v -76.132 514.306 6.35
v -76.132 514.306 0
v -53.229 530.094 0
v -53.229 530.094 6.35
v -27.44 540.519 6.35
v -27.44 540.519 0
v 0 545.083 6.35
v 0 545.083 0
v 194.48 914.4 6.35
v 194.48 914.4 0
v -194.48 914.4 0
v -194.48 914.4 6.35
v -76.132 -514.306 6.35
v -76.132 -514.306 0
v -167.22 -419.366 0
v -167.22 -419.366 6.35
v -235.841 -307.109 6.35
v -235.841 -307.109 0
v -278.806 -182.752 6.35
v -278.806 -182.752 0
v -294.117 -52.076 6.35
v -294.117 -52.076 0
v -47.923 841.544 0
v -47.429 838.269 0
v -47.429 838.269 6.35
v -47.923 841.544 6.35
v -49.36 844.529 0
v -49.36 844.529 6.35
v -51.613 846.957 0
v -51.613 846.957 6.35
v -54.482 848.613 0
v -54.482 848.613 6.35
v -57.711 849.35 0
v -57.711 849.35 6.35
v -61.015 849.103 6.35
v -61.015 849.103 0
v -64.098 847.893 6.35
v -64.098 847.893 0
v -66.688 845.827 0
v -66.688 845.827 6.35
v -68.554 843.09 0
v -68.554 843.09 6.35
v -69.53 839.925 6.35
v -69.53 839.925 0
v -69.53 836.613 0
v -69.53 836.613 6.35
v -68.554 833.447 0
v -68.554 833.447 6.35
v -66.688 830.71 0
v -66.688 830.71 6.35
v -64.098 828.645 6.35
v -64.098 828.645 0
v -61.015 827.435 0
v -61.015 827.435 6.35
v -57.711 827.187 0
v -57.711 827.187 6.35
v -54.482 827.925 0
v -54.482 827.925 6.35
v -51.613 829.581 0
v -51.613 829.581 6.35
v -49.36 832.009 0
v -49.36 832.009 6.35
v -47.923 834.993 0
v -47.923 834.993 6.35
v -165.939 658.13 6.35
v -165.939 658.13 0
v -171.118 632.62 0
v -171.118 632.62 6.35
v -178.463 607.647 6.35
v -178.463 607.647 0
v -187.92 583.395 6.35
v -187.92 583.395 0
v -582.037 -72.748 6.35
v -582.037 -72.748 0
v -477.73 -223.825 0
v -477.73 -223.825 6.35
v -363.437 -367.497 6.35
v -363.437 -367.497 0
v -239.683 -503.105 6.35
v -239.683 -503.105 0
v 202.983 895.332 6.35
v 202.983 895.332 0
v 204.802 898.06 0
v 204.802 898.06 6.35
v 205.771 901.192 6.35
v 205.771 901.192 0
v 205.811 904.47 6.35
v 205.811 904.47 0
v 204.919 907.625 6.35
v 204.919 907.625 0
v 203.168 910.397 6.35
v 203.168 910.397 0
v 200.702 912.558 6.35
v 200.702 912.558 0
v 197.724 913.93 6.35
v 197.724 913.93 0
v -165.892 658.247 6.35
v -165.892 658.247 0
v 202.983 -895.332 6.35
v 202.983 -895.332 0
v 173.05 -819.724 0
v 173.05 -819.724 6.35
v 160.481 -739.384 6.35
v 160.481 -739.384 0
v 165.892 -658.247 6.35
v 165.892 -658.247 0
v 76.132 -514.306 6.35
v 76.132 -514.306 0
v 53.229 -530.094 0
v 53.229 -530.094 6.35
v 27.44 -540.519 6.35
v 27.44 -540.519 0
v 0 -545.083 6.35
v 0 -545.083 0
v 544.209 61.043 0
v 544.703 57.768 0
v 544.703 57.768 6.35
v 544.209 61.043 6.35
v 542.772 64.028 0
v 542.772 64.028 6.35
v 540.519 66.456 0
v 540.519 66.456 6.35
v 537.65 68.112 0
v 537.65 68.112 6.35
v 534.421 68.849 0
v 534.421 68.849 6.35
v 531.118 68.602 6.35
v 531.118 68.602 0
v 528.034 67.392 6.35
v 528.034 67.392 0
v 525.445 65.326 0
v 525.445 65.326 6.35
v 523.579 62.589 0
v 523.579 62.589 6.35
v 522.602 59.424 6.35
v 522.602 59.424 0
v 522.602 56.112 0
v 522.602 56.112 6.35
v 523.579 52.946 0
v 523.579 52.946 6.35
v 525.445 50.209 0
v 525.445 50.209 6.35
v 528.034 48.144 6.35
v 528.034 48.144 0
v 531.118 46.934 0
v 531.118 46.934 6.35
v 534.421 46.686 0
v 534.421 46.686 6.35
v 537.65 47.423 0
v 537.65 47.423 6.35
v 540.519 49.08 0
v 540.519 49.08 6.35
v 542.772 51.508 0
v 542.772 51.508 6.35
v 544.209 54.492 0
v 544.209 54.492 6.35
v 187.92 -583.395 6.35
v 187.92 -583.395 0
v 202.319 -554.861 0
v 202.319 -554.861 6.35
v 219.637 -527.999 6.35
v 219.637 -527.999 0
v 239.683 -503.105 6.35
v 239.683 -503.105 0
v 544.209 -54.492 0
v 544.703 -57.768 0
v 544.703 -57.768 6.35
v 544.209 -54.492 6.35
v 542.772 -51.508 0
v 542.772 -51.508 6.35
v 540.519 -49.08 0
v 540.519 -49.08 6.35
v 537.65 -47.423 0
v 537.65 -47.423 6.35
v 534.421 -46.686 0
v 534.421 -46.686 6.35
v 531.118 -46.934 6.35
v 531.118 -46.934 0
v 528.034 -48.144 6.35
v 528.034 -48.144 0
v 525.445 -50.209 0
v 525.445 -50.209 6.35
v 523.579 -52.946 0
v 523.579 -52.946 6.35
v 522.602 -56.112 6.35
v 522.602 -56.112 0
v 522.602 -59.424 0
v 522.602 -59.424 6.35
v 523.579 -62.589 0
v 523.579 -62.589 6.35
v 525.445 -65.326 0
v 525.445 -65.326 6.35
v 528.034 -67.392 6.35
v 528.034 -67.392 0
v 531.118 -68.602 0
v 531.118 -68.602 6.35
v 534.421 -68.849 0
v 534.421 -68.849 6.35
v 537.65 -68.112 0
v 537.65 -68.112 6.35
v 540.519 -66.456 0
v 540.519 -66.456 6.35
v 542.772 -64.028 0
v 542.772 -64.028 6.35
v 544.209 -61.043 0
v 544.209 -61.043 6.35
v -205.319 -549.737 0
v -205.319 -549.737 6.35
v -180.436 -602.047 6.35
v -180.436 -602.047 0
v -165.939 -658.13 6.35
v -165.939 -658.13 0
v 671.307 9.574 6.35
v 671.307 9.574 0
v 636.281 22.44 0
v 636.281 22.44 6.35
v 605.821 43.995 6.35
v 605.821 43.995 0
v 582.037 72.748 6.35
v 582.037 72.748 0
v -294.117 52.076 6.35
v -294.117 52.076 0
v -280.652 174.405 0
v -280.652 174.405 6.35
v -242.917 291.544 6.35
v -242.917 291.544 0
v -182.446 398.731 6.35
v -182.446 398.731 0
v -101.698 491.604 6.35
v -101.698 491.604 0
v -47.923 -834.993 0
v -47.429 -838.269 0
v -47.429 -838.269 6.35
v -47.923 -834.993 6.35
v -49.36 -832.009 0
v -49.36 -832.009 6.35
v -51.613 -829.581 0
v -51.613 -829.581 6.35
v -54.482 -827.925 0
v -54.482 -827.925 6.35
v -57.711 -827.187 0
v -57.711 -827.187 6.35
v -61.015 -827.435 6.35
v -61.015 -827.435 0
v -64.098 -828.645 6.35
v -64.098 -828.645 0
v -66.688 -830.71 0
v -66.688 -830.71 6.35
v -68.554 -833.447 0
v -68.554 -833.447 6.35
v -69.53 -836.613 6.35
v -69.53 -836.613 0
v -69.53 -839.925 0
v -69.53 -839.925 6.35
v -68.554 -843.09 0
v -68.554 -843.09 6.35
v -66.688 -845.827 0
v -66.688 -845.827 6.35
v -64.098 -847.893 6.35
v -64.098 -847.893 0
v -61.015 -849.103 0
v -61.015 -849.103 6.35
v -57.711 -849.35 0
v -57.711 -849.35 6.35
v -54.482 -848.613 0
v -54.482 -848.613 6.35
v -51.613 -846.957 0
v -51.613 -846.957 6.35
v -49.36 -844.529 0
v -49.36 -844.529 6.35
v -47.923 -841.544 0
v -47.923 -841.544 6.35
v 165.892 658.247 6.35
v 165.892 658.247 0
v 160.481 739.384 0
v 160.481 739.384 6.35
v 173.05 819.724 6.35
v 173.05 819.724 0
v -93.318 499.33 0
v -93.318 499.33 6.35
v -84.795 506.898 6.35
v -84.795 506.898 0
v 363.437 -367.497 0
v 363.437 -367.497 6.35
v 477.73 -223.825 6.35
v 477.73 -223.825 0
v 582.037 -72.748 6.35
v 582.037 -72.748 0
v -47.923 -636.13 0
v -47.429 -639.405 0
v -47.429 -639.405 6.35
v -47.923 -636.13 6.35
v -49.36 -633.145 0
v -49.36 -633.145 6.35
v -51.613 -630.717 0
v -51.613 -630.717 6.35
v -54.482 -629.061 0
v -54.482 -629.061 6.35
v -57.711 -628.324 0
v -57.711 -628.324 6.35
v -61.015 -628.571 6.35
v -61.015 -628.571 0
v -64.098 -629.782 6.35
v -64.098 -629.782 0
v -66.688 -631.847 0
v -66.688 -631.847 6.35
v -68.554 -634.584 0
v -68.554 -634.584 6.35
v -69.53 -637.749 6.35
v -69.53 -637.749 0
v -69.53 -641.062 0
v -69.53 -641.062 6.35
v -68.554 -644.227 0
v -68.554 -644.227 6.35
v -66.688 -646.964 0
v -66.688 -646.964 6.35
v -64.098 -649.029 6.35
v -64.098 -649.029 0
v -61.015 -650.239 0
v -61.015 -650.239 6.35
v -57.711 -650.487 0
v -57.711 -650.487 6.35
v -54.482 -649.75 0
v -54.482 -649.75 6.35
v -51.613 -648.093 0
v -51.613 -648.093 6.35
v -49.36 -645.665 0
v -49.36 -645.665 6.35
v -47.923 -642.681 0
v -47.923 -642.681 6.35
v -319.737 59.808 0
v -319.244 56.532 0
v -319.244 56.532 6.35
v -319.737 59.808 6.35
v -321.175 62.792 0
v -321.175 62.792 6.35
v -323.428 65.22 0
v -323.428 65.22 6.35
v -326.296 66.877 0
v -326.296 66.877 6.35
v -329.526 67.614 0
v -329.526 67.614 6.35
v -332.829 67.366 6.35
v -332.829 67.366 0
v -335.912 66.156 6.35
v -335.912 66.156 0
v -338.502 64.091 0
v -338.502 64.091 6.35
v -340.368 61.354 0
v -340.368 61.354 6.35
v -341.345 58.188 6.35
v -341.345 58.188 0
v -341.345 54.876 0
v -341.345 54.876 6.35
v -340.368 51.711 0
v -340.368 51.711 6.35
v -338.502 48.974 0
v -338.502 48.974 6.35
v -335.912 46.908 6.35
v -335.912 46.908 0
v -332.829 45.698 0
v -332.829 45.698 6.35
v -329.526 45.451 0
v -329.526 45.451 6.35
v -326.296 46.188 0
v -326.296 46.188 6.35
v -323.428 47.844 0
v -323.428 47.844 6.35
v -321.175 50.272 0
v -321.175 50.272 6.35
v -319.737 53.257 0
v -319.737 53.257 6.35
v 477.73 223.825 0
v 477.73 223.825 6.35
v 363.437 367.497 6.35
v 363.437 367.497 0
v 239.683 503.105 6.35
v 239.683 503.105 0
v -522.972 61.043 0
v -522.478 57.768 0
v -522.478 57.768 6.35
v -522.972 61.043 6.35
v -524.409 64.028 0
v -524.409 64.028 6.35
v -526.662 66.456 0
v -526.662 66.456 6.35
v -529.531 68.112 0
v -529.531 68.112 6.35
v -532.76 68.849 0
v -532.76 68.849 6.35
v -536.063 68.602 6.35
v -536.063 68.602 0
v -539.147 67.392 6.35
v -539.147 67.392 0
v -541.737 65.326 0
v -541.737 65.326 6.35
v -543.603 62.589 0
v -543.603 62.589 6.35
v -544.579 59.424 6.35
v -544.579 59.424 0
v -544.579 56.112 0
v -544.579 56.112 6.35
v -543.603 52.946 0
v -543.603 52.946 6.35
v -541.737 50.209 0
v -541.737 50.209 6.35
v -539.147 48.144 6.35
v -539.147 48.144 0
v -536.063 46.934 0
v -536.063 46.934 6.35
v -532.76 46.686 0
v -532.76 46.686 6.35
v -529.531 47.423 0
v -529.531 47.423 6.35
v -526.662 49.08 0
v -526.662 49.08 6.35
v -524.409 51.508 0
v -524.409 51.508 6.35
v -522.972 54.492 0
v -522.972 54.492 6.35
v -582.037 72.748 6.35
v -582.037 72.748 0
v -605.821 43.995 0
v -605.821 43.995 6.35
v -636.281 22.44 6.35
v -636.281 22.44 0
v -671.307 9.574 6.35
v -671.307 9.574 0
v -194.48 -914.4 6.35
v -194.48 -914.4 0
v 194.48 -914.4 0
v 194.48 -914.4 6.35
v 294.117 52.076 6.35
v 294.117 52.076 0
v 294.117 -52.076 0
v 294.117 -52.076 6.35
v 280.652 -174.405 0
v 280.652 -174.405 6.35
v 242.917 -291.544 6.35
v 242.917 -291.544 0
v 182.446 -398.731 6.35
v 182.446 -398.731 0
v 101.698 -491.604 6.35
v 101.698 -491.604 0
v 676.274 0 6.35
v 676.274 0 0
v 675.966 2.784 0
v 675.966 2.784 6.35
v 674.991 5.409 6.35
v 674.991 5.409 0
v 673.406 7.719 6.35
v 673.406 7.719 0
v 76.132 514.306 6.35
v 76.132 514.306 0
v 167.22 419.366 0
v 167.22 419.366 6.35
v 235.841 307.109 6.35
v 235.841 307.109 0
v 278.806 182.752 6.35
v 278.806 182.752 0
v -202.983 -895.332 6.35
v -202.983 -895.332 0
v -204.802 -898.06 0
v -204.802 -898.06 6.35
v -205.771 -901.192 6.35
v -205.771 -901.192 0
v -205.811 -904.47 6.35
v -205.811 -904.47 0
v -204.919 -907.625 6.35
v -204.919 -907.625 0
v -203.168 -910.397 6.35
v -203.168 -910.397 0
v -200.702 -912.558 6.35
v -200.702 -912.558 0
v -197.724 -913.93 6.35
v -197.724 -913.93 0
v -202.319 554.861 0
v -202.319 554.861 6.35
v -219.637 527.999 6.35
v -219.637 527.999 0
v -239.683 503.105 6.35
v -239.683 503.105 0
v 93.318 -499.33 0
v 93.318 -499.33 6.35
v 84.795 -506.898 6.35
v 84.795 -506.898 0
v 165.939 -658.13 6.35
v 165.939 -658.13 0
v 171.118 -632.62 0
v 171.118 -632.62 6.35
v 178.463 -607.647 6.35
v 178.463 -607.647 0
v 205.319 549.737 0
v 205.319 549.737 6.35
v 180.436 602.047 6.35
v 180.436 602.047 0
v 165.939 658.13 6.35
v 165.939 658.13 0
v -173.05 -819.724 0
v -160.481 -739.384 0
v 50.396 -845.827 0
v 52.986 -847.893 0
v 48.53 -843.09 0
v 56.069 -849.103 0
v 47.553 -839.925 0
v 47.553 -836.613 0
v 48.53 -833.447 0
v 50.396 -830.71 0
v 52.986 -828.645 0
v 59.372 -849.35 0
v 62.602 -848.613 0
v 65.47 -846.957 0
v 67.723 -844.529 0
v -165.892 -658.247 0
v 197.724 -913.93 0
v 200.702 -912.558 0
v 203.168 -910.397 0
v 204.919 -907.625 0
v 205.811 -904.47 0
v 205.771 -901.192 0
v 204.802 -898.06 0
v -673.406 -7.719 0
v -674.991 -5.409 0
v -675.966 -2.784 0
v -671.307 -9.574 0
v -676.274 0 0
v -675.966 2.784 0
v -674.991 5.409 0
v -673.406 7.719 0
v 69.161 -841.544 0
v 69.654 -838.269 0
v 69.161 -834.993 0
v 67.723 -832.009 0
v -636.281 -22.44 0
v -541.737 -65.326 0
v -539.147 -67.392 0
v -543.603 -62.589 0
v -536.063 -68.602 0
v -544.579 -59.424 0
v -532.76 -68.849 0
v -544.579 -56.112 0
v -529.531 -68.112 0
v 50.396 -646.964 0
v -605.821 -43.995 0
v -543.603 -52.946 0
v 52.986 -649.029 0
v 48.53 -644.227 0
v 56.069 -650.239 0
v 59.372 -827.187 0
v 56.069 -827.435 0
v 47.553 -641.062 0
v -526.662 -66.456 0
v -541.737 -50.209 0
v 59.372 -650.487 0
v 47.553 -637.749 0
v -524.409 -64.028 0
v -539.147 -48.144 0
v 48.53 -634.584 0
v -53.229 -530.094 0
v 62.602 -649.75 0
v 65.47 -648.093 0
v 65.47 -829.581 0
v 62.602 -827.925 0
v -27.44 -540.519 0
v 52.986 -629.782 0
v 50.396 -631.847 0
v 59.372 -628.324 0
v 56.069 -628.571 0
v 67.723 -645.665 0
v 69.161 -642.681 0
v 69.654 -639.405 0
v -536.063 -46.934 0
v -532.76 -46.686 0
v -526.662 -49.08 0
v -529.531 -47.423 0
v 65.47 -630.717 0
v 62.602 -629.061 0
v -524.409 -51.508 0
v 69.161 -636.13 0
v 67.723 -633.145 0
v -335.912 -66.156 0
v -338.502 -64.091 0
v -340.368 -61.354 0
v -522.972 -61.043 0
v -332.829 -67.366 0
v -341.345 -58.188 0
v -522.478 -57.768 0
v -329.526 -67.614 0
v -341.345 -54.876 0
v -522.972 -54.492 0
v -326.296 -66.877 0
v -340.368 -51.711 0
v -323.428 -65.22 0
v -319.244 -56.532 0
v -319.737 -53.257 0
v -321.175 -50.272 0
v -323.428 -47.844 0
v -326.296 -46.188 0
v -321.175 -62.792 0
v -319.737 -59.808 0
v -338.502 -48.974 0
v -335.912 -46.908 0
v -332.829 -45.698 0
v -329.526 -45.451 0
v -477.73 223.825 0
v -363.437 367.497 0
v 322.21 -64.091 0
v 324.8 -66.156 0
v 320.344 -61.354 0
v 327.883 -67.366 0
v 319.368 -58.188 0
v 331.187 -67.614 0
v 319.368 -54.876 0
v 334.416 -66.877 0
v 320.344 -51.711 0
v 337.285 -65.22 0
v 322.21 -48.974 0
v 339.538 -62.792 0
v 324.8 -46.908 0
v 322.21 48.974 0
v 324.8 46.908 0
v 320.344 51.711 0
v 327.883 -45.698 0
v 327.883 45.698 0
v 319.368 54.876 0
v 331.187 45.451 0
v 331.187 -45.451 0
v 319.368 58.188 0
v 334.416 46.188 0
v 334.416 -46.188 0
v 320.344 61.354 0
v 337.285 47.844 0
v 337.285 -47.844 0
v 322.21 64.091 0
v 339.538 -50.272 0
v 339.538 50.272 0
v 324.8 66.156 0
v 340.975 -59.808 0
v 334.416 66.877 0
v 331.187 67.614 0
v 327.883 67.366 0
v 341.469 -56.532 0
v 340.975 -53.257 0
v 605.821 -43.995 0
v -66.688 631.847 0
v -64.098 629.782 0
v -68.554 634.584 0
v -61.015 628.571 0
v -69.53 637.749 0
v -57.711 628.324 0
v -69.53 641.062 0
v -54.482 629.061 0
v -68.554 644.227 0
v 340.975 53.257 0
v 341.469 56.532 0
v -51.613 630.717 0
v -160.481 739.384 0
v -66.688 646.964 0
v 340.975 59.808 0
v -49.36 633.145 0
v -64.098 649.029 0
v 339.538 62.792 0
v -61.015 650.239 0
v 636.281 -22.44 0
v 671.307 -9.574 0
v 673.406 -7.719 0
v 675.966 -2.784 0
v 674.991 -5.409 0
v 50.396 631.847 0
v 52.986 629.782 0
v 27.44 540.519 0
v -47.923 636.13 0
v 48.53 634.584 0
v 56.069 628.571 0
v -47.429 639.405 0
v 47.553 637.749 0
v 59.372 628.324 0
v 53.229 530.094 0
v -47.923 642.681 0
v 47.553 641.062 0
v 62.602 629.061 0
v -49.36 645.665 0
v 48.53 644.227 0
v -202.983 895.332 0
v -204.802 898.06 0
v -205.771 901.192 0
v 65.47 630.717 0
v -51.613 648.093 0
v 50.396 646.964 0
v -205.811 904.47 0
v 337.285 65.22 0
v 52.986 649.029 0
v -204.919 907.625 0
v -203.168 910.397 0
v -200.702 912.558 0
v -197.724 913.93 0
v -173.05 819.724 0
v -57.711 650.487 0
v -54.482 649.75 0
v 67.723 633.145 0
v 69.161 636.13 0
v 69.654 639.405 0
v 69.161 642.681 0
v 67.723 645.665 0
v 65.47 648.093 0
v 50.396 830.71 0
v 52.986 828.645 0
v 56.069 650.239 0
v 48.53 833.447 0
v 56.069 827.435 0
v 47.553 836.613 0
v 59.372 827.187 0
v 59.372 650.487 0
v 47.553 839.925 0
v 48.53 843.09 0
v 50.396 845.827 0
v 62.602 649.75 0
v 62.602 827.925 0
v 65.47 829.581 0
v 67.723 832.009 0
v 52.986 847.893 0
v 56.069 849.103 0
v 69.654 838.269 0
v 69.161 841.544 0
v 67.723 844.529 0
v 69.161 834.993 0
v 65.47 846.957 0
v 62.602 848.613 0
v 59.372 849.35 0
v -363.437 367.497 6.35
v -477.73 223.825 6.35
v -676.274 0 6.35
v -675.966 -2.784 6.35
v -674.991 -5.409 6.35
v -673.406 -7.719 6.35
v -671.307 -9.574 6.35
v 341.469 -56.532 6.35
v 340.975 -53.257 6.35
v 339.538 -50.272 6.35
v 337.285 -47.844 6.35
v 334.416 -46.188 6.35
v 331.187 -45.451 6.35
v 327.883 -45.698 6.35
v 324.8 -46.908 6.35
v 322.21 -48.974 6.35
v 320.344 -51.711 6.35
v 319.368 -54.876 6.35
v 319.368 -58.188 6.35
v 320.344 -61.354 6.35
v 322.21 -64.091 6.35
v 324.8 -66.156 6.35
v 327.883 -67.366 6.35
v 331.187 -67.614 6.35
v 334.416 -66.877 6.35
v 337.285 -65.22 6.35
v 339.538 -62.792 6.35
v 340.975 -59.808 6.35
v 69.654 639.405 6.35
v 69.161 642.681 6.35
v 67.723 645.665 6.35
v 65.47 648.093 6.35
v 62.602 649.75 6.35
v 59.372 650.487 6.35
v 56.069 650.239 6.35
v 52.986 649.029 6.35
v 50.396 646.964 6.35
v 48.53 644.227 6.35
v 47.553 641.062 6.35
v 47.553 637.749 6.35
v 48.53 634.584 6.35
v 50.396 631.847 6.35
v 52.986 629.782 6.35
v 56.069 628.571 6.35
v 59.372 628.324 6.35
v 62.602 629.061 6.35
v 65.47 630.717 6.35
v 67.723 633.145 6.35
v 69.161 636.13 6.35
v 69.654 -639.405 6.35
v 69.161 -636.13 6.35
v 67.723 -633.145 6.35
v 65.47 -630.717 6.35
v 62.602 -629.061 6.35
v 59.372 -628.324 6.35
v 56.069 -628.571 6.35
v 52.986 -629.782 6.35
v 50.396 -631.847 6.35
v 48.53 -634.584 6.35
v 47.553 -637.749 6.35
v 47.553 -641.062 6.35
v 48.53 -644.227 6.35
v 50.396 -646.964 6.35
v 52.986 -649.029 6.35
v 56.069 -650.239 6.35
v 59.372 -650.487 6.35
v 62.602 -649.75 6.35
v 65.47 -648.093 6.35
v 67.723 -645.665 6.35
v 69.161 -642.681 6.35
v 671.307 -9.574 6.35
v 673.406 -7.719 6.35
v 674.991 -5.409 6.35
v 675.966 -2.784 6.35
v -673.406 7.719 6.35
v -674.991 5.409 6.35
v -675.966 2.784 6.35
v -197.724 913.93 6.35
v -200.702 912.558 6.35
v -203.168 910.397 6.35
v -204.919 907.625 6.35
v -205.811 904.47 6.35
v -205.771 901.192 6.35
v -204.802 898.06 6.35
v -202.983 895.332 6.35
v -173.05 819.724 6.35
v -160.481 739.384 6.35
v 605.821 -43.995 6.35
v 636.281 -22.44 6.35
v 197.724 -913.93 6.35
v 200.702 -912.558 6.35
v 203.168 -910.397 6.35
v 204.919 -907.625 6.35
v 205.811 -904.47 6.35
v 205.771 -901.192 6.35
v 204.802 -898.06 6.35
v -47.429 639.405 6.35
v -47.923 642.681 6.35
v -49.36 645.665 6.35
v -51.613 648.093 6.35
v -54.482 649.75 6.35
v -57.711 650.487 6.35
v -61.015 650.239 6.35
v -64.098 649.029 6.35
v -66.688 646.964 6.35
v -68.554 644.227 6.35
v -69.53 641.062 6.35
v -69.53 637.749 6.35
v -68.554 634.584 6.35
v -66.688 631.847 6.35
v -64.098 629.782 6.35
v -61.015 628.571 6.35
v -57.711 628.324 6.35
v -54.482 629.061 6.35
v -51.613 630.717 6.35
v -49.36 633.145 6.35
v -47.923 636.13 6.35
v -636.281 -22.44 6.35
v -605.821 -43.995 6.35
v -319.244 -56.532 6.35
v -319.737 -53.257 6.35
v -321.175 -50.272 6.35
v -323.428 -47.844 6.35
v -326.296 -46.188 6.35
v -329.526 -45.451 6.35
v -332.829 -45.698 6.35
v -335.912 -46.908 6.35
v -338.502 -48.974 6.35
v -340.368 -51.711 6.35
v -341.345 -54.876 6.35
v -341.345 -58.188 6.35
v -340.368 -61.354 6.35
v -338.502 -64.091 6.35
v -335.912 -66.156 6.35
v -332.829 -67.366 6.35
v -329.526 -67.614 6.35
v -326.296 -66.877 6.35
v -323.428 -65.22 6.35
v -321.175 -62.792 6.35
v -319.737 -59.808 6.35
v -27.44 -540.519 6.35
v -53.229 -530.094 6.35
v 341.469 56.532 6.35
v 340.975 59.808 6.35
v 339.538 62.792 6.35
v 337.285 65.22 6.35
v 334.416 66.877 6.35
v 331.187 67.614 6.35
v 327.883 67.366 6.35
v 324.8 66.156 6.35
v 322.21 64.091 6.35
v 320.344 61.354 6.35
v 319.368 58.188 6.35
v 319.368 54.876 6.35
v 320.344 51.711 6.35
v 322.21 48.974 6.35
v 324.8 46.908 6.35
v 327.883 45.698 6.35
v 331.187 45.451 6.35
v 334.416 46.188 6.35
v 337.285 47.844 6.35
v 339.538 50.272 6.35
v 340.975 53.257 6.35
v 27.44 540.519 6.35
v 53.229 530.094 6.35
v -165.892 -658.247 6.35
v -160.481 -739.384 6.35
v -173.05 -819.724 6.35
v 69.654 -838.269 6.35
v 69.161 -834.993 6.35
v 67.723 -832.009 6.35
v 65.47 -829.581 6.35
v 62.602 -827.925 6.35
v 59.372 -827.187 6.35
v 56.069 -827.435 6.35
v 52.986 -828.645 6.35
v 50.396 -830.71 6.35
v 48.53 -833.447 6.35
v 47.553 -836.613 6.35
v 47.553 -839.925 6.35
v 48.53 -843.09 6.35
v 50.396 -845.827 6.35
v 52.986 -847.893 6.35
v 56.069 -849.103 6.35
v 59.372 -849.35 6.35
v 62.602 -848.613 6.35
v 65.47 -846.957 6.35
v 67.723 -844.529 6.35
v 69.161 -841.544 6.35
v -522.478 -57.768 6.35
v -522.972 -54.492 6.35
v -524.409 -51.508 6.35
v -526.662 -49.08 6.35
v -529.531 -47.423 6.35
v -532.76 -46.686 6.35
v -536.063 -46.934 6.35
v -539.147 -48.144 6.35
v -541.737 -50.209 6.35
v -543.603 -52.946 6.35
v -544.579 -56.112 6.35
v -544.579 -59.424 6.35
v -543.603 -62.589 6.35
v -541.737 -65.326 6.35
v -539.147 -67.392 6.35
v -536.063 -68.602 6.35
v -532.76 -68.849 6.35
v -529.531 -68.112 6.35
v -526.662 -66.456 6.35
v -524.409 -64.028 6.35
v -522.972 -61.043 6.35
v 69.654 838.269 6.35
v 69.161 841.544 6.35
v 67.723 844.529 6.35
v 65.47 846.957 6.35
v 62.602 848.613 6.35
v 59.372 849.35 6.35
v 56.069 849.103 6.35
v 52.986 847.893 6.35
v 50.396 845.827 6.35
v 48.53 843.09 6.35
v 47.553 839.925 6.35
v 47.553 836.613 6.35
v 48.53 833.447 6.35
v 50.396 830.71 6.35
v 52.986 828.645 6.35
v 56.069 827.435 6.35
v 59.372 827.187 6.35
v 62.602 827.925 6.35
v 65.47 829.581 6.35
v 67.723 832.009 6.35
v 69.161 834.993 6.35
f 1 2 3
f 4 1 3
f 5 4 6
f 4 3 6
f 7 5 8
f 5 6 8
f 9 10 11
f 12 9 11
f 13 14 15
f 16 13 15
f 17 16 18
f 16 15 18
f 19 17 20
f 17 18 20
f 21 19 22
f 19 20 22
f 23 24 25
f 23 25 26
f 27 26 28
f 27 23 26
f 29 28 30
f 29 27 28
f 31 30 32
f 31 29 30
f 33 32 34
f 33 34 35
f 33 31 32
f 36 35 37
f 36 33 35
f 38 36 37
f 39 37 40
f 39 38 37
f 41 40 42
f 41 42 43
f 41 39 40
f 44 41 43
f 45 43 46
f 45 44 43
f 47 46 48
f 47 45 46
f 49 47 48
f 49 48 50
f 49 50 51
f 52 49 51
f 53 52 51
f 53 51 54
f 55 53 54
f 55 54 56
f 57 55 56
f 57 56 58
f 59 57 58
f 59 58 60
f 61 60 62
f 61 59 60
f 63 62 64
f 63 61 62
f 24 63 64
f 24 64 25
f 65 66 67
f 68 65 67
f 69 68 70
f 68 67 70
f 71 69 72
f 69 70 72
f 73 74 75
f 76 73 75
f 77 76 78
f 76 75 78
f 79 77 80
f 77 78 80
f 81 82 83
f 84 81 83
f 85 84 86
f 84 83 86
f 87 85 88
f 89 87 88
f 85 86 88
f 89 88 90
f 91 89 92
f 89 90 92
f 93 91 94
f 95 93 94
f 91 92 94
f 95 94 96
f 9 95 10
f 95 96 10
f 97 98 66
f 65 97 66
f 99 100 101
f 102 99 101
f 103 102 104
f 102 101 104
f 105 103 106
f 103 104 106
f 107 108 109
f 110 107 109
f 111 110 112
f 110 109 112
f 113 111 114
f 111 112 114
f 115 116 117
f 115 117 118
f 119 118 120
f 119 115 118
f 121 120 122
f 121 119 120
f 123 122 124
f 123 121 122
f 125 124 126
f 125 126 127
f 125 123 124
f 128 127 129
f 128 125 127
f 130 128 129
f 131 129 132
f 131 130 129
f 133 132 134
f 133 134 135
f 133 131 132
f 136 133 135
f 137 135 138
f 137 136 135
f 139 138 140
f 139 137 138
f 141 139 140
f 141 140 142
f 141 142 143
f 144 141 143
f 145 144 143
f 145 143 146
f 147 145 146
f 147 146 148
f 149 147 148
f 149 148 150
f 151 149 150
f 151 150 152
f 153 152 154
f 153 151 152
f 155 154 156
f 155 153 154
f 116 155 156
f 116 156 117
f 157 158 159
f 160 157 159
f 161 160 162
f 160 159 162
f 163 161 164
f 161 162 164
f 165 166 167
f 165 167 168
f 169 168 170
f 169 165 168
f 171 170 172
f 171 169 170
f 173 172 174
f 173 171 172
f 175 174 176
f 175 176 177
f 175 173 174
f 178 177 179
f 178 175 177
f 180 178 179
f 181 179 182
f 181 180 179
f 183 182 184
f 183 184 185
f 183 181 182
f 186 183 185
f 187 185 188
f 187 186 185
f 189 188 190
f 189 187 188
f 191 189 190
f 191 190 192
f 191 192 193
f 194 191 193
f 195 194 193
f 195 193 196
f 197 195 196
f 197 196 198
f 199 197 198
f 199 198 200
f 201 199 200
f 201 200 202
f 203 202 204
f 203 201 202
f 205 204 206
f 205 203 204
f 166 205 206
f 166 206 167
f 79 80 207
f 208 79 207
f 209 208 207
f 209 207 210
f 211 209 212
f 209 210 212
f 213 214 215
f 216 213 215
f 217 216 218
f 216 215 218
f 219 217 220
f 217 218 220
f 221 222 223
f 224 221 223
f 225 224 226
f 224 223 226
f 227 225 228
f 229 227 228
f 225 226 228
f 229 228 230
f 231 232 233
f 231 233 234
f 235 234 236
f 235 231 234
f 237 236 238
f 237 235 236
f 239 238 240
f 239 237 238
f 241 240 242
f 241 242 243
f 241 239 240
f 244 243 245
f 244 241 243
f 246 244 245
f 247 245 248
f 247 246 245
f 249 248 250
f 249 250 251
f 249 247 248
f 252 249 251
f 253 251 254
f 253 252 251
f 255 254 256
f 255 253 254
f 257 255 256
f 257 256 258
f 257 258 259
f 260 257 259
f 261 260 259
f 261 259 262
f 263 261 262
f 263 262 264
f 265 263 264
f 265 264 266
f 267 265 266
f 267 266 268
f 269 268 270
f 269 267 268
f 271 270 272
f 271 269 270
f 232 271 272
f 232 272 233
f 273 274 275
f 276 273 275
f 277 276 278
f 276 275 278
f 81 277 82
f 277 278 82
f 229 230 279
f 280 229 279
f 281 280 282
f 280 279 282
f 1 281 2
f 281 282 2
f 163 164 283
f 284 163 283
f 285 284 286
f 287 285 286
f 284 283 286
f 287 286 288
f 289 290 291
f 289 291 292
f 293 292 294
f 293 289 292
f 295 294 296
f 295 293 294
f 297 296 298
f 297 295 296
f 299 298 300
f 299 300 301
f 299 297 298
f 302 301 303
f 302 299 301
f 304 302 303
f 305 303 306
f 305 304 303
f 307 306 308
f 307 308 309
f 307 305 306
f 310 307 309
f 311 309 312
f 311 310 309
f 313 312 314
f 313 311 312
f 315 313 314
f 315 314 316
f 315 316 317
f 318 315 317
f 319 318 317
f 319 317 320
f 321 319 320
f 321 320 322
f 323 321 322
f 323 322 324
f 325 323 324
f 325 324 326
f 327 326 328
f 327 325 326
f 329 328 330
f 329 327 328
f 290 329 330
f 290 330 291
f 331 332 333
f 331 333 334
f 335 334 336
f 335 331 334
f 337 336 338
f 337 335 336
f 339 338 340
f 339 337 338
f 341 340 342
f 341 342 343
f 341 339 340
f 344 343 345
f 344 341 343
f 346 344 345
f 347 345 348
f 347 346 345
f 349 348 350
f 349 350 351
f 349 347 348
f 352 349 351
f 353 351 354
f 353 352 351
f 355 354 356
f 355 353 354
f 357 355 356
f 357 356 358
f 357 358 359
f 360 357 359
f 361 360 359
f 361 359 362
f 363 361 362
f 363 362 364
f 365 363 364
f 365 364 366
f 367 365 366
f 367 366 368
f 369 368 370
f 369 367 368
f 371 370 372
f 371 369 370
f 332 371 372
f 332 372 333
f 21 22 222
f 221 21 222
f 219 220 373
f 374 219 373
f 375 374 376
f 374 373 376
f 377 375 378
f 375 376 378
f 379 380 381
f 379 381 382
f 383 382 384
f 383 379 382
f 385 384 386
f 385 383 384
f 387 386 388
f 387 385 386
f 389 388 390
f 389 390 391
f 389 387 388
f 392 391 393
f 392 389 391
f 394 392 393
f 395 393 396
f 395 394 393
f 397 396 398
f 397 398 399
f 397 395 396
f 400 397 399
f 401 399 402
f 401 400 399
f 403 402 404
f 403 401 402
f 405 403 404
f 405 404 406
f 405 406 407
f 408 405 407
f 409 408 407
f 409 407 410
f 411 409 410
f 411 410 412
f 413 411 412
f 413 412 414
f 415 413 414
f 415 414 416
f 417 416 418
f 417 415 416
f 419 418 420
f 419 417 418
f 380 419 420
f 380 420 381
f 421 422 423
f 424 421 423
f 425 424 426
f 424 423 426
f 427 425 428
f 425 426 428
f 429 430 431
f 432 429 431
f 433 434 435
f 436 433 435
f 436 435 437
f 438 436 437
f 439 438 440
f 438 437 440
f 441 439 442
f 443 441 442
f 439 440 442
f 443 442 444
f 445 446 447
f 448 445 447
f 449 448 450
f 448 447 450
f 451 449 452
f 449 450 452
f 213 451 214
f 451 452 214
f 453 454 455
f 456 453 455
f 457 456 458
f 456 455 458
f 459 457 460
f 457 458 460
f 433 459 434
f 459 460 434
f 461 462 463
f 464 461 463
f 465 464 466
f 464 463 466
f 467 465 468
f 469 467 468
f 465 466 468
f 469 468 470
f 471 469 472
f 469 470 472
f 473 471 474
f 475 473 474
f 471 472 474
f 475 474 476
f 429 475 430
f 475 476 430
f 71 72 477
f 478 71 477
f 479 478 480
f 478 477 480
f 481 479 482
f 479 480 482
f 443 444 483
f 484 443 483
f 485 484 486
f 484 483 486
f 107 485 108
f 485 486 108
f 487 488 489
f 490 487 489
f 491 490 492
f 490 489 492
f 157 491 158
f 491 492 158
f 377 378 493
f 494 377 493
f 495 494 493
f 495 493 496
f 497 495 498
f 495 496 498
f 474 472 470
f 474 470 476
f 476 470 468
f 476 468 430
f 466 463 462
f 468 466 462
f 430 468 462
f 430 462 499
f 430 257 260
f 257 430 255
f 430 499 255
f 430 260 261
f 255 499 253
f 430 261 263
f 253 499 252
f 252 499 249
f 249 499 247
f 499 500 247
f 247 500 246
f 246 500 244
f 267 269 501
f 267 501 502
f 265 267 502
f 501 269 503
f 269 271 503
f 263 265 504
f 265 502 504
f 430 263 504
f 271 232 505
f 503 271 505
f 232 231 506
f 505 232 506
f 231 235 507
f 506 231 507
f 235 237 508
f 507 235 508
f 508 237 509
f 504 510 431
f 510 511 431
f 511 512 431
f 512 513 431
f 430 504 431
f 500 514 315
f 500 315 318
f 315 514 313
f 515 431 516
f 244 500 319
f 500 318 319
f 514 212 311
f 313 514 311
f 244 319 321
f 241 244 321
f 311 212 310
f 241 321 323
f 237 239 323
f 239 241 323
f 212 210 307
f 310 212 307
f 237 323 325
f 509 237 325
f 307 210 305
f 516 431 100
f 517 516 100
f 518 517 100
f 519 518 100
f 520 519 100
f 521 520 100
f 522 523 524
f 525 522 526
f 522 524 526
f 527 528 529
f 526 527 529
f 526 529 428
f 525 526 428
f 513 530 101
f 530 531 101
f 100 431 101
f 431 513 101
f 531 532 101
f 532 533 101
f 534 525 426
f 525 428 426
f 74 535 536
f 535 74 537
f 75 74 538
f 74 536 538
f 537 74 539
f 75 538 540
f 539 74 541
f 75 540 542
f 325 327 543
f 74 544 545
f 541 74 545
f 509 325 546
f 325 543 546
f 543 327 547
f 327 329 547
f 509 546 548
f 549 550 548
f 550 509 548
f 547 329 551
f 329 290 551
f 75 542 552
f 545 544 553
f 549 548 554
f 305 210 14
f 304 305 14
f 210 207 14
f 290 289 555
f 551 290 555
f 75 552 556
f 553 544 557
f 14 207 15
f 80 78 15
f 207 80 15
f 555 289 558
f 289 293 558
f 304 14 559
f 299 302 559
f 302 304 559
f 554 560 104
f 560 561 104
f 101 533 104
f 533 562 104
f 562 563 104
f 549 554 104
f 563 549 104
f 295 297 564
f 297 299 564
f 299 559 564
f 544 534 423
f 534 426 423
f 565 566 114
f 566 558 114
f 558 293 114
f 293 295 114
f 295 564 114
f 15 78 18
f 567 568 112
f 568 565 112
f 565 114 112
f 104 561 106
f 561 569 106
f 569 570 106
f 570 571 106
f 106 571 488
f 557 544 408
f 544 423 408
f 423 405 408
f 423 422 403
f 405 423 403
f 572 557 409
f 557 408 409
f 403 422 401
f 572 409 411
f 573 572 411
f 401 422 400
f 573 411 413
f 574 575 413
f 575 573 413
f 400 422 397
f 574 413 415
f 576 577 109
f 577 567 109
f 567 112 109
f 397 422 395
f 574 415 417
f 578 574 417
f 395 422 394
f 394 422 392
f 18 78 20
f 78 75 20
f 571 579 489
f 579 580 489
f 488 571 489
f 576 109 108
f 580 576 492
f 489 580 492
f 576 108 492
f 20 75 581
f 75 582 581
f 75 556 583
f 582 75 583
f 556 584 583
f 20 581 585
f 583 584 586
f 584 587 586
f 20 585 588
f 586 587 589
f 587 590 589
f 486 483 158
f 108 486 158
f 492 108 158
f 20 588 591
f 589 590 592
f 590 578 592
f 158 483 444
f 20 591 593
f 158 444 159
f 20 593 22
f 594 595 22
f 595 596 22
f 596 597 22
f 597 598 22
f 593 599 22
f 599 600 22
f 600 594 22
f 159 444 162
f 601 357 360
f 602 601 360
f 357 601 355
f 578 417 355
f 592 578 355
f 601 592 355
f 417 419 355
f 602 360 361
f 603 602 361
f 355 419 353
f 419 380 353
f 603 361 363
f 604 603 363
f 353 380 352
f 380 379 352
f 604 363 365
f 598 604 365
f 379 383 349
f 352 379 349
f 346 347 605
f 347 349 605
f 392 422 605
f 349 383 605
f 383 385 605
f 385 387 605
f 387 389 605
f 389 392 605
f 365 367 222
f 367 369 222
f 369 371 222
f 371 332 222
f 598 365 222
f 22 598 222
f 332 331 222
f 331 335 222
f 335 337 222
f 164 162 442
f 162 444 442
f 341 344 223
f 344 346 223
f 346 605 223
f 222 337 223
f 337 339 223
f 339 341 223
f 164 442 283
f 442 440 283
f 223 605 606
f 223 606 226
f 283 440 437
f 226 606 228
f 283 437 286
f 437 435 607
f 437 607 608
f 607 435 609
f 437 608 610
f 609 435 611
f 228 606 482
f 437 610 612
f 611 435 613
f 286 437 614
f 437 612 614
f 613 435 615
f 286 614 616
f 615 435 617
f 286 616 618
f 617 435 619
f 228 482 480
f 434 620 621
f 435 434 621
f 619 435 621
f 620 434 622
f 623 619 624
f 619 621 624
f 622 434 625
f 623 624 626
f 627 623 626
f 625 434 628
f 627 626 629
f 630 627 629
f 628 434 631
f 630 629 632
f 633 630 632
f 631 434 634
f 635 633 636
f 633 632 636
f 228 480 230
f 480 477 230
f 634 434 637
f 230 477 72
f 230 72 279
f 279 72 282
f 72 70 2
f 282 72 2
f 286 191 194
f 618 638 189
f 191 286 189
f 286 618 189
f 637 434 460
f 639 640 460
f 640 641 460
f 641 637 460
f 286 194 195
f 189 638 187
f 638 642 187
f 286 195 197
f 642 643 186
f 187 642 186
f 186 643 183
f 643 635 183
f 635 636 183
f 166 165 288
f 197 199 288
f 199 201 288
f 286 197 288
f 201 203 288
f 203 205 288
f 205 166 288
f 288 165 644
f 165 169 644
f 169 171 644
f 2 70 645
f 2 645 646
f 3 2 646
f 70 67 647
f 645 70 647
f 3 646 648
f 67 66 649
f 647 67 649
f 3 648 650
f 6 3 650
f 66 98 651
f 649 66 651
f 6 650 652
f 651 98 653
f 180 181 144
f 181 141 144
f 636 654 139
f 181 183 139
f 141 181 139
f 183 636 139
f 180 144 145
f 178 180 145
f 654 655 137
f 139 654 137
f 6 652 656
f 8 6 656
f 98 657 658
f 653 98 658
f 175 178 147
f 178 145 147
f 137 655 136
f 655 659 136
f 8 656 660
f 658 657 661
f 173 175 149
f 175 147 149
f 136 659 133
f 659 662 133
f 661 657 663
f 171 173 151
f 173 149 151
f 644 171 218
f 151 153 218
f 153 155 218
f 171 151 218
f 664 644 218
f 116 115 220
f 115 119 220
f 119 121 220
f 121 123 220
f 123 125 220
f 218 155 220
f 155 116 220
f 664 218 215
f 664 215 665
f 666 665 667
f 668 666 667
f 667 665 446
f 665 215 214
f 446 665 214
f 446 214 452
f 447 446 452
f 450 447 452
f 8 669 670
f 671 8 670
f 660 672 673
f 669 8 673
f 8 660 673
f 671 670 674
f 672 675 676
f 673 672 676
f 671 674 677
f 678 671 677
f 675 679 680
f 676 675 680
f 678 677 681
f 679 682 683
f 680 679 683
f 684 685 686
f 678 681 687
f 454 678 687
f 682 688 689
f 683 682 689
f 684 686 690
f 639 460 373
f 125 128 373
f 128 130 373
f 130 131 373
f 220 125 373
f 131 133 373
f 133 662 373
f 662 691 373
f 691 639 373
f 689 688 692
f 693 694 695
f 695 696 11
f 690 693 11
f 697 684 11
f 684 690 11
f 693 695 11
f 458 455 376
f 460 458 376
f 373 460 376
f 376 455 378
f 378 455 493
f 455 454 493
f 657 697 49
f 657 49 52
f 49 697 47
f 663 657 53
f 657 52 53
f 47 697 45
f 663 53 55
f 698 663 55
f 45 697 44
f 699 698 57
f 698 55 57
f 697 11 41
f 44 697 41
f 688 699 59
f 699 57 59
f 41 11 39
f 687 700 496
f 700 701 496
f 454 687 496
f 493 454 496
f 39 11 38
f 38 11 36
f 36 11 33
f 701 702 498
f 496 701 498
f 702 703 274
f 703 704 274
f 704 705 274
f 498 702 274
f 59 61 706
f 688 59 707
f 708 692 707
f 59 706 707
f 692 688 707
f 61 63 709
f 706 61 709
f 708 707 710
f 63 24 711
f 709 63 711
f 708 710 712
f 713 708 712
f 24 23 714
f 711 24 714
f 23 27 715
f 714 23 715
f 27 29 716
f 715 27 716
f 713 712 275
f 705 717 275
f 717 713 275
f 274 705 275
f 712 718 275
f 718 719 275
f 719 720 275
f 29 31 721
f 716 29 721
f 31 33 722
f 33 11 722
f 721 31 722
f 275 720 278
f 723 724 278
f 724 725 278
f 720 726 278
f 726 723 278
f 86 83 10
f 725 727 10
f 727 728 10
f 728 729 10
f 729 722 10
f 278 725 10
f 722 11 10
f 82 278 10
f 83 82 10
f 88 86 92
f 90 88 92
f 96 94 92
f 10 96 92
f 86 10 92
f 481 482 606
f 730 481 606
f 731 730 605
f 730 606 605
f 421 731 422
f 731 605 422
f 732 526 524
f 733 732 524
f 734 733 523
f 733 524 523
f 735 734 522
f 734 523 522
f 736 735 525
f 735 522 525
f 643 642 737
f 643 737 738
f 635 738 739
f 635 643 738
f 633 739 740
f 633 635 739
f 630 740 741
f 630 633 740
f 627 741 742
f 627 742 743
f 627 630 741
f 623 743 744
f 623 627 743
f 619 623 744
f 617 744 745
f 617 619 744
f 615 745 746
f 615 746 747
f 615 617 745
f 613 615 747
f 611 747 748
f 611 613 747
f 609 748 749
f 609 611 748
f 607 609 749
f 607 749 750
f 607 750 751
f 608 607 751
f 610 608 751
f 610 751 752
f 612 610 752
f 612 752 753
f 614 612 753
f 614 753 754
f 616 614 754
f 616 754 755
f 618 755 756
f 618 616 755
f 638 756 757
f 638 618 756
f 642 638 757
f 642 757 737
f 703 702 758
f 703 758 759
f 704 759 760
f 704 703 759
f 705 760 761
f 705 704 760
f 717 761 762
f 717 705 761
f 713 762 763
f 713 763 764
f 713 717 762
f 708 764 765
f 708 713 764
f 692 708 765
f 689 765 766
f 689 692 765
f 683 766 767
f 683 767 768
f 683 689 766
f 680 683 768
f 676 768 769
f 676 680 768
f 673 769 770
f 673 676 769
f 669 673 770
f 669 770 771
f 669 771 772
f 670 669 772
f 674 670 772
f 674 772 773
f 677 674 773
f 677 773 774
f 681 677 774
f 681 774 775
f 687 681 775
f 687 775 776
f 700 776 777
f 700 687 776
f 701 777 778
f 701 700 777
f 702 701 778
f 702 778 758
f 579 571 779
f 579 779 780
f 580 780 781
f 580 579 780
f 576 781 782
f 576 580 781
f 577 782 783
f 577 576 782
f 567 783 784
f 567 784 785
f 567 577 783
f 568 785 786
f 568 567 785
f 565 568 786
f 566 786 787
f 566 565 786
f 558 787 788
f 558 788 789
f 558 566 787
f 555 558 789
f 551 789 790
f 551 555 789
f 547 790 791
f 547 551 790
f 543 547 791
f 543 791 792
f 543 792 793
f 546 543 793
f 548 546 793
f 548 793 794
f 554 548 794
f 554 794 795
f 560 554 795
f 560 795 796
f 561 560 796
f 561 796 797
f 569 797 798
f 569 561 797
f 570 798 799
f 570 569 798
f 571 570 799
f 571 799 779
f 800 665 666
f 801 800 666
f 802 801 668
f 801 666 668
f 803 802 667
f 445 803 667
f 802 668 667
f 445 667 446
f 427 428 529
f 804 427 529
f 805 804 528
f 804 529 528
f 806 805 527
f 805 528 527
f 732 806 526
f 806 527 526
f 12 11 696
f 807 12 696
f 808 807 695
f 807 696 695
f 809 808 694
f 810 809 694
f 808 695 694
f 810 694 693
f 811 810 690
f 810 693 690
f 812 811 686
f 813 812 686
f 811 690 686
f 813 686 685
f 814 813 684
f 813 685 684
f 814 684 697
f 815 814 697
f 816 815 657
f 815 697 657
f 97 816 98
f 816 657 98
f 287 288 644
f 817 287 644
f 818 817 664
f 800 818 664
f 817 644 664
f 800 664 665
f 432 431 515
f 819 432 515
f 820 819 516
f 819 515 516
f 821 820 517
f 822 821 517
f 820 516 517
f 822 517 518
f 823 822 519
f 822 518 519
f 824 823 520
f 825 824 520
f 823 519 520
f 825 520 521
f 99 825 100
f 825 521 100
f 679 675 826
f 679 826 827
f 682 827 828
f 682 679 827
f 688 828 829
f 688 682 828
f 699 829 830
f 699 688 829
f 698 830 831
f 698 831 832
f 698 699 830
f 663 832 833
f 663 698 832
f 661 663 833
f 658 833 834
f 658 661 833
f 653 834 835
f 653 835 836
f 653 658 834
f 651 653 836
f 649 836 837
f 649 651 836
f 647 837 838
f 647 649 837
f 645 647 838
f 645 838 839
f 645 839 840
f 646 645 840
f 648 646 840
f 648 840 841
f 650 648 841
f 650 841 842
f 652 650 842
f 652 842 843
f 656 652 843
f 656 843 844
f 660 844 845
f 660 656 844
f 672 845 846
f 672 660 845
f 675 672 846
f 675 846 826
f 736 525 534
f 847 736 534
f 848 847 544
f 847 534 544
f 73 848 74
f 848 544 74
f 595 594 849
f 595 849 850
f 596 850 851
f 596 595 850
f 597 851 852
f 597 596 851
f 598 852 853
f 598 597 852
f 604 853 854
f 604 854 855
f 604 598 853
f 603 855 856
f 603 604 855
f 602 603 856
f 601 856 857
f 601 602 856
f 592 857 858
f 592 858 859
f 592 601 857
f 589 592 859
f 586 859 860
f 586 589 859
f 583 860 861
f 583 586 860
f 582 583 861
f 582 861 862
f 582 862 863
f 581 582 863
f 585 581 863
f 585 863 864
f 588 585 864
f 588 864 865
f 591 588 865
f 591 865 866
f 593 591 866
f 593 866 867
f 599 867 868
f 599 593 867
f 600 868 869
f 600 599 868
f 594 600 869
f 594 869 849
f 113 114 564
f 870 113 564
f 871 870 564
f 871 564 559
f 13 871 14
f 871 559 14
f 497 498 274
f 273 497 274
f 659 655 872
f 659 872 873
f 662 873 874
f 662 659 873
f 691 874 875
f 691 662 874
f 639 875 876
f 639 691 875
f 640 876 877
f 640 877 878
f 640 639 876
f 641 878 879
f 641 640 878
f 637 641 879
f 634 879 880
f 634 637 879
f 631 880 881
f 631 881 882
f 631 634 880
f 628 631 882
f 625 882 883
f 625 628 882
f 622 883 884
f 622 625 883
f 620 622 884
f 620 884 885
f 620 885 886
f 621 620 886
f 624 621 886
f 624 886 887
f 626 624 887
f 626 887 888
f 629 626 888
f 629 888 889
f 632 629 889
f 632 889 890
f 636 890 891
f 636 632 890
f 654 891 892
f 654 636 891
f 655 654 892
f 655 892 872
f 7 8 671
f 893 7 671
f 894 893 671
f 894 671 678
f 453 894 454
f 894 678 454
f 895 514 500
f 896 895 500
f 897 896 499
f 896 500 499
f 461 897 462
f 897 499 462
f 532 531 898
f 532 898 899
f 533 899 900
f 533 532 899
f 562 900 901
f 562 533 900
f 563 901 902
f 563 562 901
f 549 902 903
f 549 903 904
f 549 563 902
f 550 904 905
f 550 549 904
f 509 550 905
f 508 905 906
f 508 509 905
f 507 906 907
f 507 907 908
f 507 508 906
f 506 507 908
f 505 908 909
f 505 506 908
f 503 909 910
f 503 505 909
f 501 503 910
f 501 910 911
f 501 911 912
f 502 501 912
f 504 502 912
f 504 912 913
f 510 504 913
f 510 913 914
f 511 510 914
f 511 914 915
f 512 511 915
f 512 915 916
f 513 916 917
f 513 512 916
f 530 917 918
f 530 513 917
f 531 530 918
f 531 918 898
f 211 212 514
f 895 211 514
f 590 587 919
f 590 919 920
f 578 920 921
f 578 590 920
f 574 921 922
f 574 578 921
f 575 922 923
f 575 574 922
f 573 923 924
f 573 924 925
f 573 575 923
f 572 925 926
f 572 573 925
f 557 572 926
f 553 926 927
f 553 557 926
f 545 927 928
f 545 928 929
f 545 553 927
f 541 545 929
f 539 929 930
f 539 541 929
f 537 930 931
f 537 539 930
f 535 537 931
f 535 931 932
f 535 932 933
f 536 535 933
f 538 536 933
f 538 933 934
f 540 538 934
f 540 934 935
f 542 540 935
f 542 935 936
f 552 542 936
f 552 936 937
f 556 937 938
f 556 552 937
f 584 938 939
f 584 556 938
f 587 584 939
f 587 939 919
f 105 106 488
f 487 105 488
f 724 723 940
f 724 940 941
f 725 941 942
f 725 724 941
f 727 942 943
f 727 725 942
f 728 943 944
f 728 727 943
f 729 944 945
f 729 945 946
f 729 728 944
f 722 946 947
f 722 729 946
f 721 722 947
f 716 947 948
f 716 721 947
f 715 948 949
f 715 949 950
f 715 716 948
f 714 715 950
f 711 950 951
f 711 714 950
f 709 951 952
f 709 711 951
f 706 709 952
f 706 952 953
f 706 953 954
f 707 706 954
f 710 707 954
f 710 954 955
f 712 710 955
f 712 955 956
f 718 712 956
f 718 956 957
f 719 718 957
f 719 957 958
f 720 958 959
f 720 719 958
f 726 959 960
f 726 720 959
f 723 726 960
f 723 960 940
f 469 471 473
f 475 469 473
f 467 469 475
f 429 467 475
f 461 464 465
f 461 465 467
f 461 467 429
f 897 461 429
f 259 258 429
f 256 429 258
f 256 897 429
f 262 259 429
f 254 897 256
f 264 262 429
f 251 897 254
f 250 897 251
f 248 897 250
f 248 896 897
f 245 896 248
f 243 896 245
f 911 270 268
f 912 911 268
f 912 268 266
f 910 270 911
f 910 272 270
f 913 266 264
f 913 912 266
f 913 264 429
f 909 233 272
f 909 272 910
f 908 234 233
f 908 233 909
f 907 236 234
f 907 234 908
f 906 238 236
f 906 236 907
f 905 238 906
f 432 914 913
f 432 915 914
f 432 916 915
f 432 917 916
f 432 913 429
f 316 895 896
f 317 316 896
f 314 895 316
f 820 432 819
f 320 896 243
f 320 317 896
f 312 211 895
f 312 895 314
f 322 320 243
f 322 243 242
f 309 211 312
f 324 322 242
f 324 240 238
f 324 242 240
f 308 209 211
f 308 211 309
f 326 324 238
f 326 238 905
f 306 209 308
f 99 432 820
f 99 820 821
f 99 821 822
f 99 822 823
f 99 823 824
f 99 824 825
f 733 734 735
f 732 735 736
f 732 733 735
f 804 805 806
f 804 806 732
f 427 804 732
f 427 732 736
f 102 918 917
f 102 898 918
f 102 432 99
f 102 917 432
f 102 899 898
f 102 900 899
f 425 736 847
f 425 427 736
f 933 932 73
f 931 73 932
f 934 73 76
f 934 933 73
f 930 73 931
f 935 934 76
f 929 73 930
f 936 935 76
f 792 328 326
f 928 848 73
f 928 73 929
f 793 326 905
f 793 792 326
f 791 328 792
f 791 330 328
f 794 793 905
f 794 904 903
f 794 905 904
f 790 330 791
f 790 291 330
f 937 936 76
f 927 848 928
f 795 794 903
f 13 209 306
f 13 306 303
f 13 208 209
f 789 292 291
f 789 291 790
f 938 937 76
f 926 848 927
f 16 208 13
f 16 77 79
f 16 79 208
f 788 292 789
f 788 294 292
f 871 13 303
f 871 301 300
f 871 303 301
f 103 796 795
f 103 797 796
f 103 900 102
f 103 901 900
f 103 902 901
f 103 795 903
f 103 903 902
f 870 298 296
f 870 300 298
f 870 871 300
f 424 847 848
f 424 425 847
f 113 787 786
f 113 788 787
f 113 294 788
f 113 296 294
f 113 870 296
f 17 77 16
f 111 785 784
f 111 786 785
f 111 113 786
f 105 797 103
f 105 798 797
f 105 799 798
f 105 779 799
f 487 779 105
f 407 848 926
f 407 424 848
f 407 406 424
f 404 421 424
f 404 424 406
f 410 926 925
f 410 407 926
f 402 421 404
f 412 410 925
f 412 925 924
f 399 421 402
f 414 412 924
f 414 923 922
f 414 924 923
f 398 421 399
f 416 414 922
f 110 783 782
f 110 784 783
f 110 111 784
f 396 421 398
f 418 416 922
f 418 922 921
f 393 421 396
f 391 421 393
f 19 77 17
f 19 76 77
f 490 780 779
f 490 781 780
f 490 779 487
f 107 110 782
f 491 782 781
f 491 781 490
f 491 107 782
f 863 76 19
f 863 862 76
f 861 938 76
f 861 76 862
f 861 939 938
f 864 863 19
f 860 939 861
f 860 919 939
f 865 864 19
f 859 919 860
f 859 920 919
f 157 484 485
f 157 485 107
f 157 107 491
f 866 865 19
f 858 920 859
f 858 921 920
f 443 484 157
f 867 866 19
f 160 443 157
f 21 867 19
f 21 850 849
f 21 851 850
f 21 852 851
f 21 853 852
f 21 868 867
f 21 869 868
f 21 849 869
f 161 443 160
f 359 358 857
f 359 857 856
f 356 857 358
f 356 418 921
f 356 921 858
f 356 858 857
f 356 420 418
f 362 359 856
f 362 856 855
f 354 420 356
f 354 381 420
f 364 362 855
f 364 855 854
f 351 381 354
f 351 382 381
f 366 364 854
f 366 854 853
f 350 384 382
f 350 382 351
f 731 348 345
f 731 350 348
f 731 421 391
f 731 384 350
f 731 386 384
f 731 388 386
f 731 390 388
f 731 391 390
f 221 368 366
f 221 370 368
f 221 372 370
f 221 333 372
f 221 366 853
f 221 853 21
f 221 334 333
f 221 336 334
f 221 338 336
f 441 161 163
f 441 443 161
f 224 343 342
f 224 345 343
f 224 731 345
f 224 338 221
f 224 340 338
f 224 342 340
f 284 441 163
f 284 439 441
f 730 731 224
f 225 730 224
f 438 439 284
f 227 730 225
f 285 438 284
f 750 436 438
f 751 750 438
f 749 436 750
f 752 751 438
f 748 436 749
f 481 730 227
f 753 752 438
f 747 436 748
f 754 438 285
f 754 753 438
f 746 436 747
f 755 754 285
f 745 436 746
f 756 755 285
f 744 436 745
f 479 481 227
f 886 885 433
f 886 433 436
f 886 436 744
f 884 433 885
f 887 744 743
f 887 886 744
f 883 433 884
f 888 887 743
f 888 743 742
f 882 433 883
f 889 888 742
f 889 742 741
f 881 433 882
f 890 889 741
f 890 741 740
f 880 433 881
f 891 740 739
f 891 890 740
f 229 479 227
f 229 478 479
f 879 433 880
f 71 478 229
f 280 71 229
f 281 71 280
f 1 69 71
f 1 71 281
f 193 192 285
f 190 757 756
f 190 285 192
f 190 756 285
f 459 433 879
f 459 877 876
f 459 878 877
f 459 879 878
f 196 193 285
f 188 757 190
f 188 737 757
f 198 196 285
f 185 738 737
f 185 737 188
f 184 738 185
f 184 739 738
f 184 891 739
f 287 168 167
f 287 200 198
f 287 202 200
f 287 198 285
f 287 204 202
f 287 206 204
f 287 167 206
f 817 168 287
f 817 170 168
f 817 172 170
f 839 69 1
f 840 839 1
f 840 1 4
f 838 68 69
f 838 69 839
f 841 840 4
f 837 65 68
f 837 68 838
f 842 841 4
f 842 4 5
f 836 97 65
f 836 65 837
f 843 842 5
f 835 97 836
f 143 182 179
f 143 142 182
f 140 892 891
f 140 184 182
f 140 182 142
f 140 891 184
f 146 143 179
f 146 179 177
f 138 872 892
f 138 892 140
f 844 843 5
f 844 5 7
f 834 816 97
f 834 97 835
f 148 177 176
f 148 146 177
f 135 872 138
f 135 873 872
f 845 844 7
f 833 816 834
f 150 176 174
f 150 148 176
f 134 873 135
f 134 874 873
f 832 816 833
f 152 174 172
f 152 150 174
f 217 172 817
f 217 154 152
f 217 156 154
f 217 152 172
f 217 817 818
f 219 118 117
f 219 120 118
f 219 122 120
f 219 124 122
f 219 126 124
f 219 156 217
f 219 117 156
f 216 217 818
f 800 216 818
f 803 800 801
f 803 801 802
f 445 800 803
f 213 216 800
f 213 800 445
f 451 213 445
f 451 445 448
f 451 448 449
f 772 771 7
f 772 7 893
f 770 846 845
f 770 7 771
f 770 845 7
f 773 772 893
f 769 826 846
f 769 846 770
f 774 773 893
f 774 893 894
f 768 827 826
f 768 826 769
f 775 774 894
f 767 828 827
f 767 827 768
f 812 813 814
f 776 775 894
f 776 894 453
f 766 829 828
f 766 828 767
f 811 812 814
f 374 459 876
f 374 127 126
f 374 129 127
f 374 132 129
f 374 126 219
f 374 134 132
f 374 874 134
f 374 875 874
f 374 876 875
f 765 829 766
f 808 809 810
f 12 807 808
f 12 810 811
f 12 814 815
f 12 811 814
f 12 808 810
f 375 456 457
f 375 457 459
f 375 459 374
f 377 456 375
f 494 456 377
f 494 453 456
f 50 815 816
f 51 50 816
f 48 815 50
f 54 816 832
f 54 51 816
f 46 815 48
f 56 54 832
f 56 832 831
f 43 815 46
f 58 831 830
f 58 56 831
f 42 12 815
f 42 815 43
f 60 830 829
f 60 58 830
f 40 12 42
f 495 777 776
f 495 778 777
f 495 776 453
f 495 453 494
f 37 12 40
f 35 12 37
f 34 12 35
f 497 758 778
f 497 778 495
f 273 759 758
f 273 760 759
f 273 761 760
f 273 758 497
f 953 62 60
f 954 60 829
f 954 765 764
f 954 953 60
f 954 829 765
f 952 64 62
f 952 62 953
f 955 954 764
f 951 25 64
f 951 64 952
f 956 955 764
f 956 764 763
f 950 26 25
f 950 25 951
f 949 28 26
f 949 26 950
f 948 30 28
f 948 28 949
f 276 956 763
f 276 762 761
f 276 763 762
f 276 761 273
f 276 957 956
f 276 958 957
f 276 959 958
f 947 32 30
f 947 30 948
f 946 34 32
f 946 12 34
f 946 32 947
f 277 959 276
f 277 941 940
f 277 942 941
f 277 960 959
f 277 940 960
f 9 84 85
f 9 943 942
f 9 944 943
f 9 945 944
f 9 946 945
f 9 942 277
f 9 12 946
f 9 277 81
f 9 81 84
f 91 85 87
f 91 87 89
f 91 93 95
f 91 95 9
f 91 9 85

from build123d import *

# Parameters (mm, degrees)
SKETCH2_R           = 11.1125
BOSS_EXTRUDE1_DEPTH = 6.35


with BuildPart() as part:
    # Sketch2 → Boss-Extrude1 (new body)
    with BuildSketch(Plane.XY):
        with BuildLine():
            Line((0, 914.4), (-194.479849892, 914.4))
            ThreePointArc((-194.479849892, 914.4), (-204.91887294, 907.625287079), (-202.983200568, 895.332073104))
            ThreePointArc((-202.983200568, 895.332073104), (-164.535916973, 779.903104595), (-165.892020397, 658.247026365))
            Line((-165.892020397, 658.247026365), (-165.938886188, 658.129795086))
            ThreePointArc((-165.938886188, 658.129795086), (-174.522720833, 620.054602536), (-187.919807247, 583.395080165))
            ThreePointArc((-187.919807247, 583.395080165), (-210.62430537, 541.201744159), (-239.683438479, 503.105305725))
            ThreePointArc((-239.683438479, 503.105305725), (-421.799875663, 296.628923536), (-582.037423098, 72.747657042))
            ThreePointArc((-582.037423098, 72.747657042), (-620.339092238, 32.211350912), (-671.307126152, 9.573561873))
            ThreePointArc((-671.307126152, 9.573561873), (-674.990888604, 5.409489794), (-676.274252252, 0))
            ThreePointArc((-676.274252252, 0), (-674.990888604, -5.409489794), (-671.307126152, -9.573561873))
            ThreePointArc((-671.307126152, -9.573561873), (-620.339092238, -32.211350912), (-582.037423098, -72.747657042))
            ThreePointArc((-582.037423098, -72.747657042), (-421.799875663, -296.628923536), (-239.683438479, -503.105305725))
            ThreePointArc((-239.683438479, -503.105305725), (-191.627212465, -575.297388544), (-165.938886188, -658.129795086))
            Line((-165.938886188, -658.129795086), (-165.892020397, -658.247026365))
            ThreePointArc((-165.892020397, -658.247026365), (-164.535916973, -779.903104595), (-202.983200568, -895.332073104))
            ThreePointArc((-202.983200568, -895.332073104), (-204.91887294, -907.625287079), (-194.479849892, -914.4))
            Line((-194.479849892, -914.4), (0, -914.4))
            Line((0, -914.4), (194.479849892, -914.4))
            ThreePointArc((194.479849892, -914.4), (204.91887294, -907.625287079), (202.983200568, -895.332073104))
            ThreePointArc((202.983200568, -895.332073104), (164.535916973, -779.903104595), (165.892020397, -658.247026365))
            Line((165.892020397, -658.247026365), (165.938886188, -658.129795086))
            ThreePointArc((165.938886188, -658.129795086), (174.522720833, -620.054602536), (187.919807247, -583.395080165))
            ThreePointArc((187.919807247, -583.395080165), (210.62430537, -541.201744159), (239.683438479, -503.105305725))
            ThreePointArc((239.683438479, -503.105305725), (421.799875663, -296.628923536), (582.037423098, -72.747657043))
            ThreePointArc((582.037423098, -72.747657043), (620.339092238, -32.211350912), (671.307126152, -9.573561873))
            ThreePointArc((671.307126152, -9.573561873), (674.990888603, -5.409489794), (676.274252252, 0))
            ThreePointArc((676.274252252, 0), (674.990888604, 5.409489794), (671.307126152, 9.573561873))
            ThreePointArc((671.307126152, 9.573561873), (620.339092238, 32.211350912), (582.037423098, 72.747657042))
            ThreePointArc((582.037423098, 72.747657042), (421.799875663, 296.628923536), (239.683438479, 503.105305725))
            ThreePointArc((239.683438479, 503.105305725), (191.627212465, 575.297388544), (165.938886188, 658.129795086))
            Line((165.938886188, 658.129795086), (165.892020397, 658.247026365))
            ThreePointArc((165.892020397, 658.247026365), (164.535916973, 779.903104595), (202.983200568, 895.332073104))
            ThreePointArc((202.983200568, 895.332073104), (204.91887294, 907.625287079), (194.479849892, 914.4))
            Line((194.479849892, 914.4), (0, 914.4))
        make_face()
        with Locations((-58.541769794, -639.405335996)):
            Circle(SKETCH2_R, mode=Mode.SUBTRACT)
        with Locations((-58.541769794, -838.268909678)):
            Circle(SKETCH2_R, mode=Mode.SUBTRACT)
        with Locations((58.541769794, -838.268909678)):
            Circle(SKETCH2_R, mode=Mode.SUBTRACT)
        with Locations((58.541769794, -639.405335996)):
            Circle(SKETCH2_R, mode=Mode.SUBTRACT)
        with Locations((533.590599666, -57.767812484)):
            Circle(SKETCH2_R, mode=Mode.SUBTRACT)
        with Locations((330.356144827, -56.532187516)):
            Circle(SKETCH2_R, mode=Mode.SUBTRACT)
        with Locations((330.356144827, 56.532187516)):
            Circle(SKETCH2_R, mode=Mode.SUBTRACT)
        with Locations((533.590599666, 57.767812484)):
            Circle(SKETCH2_R, mode=Mode.SUBTRACT)
        with Locations((58.541769794, 838.268909678)):
            Circle(SKETCH2_R, mode=Mode.SUBTRACT)
        with Locations((-58.541769794, 838.268909678)):
            Circle(SKETCH2_R, mode=Mode.SUBTRACT)
        with Locations((-58.541769794, 639.405335996)):
            Circle(SKETCH2_R, mode=Mode.SUBTRACT)
        with Locations((58.541769794, 639.405335996)):
            Circle(SKETCH2_R, mode=Mode.SUBTRACT)
        with Locations((-330.356144827, -56.532187516)):
            Circle(SKETCH2_R, mode=Mode.SUBTRACT)
        with Locations((-330.356144827, 56.532187516)):
            Circle(SKETCH2_R, mode=Mode.SUBTRACT)
        with Locations((-533.590599666, 57.767812484)):
            Circle(SKETCH2_R, mode=Mode.SUBTRACT)
        with Locations((-533.590599666, -57.767812484)):
            Circle(SKETCH2_R, mode=Mode.SUBTRACT)
        with BuildLine():
            Line((294.116579618, 52.07611641), (294.116579618, -52.07611641))
            ThreePointArc((294.116579618, -52.07611641), (242.916605185, -291.544447454), (101.6983636, -491.604256507))
            ThreePointArc((101.6983636, -491.604256507), (89.07407881, -503.133976698), (76.131755899, -514.305516063))
            ThreePointArc((76.131755899, -514.305516063), (40.620898237, -536.014461284), (0, -545.083195538))
            ThreePointArc((0, -545.083195538), (-40.620898237, -536.014461284), (-76.131755899, -514.305516063))
            ThreePointArc((-76.131755899, -514.305516063), (-235.841357727, -307.108762007), (-294.116579618, -52.07611641))
            Line((-294.116579618, -52.07611641), (-294.116579618, 52.07611641))
            ThreePointArc((-294.116579618, 52.07611641), (-242.916605185, 291.544447454), (-101.6983636, 491.604256507))
            ThreePointArc((-101.6983636, 491.604256507), (-89.07407881, 503.133976698), (-76.131755899, 514.305516063))
            ThreePointArc((-76.131755899, 514.305516063), (-40.620898237, 536.014461284), (0, 545.083195538))
            ThreePointArc((0, 545.083195538), (40.620898237, 536.014461284), (76.131755899, 514.305516063))
            ThreePointArc((76.131755899, 514.305516063), (235.841357727, 307.108762007), (294.116579618, 52.07611641))
        make_face(mode=Mode.SUBTRACT)
    extrude(amount=BOSS_EXTRUDE1_DEPTH)


solid = part.part
